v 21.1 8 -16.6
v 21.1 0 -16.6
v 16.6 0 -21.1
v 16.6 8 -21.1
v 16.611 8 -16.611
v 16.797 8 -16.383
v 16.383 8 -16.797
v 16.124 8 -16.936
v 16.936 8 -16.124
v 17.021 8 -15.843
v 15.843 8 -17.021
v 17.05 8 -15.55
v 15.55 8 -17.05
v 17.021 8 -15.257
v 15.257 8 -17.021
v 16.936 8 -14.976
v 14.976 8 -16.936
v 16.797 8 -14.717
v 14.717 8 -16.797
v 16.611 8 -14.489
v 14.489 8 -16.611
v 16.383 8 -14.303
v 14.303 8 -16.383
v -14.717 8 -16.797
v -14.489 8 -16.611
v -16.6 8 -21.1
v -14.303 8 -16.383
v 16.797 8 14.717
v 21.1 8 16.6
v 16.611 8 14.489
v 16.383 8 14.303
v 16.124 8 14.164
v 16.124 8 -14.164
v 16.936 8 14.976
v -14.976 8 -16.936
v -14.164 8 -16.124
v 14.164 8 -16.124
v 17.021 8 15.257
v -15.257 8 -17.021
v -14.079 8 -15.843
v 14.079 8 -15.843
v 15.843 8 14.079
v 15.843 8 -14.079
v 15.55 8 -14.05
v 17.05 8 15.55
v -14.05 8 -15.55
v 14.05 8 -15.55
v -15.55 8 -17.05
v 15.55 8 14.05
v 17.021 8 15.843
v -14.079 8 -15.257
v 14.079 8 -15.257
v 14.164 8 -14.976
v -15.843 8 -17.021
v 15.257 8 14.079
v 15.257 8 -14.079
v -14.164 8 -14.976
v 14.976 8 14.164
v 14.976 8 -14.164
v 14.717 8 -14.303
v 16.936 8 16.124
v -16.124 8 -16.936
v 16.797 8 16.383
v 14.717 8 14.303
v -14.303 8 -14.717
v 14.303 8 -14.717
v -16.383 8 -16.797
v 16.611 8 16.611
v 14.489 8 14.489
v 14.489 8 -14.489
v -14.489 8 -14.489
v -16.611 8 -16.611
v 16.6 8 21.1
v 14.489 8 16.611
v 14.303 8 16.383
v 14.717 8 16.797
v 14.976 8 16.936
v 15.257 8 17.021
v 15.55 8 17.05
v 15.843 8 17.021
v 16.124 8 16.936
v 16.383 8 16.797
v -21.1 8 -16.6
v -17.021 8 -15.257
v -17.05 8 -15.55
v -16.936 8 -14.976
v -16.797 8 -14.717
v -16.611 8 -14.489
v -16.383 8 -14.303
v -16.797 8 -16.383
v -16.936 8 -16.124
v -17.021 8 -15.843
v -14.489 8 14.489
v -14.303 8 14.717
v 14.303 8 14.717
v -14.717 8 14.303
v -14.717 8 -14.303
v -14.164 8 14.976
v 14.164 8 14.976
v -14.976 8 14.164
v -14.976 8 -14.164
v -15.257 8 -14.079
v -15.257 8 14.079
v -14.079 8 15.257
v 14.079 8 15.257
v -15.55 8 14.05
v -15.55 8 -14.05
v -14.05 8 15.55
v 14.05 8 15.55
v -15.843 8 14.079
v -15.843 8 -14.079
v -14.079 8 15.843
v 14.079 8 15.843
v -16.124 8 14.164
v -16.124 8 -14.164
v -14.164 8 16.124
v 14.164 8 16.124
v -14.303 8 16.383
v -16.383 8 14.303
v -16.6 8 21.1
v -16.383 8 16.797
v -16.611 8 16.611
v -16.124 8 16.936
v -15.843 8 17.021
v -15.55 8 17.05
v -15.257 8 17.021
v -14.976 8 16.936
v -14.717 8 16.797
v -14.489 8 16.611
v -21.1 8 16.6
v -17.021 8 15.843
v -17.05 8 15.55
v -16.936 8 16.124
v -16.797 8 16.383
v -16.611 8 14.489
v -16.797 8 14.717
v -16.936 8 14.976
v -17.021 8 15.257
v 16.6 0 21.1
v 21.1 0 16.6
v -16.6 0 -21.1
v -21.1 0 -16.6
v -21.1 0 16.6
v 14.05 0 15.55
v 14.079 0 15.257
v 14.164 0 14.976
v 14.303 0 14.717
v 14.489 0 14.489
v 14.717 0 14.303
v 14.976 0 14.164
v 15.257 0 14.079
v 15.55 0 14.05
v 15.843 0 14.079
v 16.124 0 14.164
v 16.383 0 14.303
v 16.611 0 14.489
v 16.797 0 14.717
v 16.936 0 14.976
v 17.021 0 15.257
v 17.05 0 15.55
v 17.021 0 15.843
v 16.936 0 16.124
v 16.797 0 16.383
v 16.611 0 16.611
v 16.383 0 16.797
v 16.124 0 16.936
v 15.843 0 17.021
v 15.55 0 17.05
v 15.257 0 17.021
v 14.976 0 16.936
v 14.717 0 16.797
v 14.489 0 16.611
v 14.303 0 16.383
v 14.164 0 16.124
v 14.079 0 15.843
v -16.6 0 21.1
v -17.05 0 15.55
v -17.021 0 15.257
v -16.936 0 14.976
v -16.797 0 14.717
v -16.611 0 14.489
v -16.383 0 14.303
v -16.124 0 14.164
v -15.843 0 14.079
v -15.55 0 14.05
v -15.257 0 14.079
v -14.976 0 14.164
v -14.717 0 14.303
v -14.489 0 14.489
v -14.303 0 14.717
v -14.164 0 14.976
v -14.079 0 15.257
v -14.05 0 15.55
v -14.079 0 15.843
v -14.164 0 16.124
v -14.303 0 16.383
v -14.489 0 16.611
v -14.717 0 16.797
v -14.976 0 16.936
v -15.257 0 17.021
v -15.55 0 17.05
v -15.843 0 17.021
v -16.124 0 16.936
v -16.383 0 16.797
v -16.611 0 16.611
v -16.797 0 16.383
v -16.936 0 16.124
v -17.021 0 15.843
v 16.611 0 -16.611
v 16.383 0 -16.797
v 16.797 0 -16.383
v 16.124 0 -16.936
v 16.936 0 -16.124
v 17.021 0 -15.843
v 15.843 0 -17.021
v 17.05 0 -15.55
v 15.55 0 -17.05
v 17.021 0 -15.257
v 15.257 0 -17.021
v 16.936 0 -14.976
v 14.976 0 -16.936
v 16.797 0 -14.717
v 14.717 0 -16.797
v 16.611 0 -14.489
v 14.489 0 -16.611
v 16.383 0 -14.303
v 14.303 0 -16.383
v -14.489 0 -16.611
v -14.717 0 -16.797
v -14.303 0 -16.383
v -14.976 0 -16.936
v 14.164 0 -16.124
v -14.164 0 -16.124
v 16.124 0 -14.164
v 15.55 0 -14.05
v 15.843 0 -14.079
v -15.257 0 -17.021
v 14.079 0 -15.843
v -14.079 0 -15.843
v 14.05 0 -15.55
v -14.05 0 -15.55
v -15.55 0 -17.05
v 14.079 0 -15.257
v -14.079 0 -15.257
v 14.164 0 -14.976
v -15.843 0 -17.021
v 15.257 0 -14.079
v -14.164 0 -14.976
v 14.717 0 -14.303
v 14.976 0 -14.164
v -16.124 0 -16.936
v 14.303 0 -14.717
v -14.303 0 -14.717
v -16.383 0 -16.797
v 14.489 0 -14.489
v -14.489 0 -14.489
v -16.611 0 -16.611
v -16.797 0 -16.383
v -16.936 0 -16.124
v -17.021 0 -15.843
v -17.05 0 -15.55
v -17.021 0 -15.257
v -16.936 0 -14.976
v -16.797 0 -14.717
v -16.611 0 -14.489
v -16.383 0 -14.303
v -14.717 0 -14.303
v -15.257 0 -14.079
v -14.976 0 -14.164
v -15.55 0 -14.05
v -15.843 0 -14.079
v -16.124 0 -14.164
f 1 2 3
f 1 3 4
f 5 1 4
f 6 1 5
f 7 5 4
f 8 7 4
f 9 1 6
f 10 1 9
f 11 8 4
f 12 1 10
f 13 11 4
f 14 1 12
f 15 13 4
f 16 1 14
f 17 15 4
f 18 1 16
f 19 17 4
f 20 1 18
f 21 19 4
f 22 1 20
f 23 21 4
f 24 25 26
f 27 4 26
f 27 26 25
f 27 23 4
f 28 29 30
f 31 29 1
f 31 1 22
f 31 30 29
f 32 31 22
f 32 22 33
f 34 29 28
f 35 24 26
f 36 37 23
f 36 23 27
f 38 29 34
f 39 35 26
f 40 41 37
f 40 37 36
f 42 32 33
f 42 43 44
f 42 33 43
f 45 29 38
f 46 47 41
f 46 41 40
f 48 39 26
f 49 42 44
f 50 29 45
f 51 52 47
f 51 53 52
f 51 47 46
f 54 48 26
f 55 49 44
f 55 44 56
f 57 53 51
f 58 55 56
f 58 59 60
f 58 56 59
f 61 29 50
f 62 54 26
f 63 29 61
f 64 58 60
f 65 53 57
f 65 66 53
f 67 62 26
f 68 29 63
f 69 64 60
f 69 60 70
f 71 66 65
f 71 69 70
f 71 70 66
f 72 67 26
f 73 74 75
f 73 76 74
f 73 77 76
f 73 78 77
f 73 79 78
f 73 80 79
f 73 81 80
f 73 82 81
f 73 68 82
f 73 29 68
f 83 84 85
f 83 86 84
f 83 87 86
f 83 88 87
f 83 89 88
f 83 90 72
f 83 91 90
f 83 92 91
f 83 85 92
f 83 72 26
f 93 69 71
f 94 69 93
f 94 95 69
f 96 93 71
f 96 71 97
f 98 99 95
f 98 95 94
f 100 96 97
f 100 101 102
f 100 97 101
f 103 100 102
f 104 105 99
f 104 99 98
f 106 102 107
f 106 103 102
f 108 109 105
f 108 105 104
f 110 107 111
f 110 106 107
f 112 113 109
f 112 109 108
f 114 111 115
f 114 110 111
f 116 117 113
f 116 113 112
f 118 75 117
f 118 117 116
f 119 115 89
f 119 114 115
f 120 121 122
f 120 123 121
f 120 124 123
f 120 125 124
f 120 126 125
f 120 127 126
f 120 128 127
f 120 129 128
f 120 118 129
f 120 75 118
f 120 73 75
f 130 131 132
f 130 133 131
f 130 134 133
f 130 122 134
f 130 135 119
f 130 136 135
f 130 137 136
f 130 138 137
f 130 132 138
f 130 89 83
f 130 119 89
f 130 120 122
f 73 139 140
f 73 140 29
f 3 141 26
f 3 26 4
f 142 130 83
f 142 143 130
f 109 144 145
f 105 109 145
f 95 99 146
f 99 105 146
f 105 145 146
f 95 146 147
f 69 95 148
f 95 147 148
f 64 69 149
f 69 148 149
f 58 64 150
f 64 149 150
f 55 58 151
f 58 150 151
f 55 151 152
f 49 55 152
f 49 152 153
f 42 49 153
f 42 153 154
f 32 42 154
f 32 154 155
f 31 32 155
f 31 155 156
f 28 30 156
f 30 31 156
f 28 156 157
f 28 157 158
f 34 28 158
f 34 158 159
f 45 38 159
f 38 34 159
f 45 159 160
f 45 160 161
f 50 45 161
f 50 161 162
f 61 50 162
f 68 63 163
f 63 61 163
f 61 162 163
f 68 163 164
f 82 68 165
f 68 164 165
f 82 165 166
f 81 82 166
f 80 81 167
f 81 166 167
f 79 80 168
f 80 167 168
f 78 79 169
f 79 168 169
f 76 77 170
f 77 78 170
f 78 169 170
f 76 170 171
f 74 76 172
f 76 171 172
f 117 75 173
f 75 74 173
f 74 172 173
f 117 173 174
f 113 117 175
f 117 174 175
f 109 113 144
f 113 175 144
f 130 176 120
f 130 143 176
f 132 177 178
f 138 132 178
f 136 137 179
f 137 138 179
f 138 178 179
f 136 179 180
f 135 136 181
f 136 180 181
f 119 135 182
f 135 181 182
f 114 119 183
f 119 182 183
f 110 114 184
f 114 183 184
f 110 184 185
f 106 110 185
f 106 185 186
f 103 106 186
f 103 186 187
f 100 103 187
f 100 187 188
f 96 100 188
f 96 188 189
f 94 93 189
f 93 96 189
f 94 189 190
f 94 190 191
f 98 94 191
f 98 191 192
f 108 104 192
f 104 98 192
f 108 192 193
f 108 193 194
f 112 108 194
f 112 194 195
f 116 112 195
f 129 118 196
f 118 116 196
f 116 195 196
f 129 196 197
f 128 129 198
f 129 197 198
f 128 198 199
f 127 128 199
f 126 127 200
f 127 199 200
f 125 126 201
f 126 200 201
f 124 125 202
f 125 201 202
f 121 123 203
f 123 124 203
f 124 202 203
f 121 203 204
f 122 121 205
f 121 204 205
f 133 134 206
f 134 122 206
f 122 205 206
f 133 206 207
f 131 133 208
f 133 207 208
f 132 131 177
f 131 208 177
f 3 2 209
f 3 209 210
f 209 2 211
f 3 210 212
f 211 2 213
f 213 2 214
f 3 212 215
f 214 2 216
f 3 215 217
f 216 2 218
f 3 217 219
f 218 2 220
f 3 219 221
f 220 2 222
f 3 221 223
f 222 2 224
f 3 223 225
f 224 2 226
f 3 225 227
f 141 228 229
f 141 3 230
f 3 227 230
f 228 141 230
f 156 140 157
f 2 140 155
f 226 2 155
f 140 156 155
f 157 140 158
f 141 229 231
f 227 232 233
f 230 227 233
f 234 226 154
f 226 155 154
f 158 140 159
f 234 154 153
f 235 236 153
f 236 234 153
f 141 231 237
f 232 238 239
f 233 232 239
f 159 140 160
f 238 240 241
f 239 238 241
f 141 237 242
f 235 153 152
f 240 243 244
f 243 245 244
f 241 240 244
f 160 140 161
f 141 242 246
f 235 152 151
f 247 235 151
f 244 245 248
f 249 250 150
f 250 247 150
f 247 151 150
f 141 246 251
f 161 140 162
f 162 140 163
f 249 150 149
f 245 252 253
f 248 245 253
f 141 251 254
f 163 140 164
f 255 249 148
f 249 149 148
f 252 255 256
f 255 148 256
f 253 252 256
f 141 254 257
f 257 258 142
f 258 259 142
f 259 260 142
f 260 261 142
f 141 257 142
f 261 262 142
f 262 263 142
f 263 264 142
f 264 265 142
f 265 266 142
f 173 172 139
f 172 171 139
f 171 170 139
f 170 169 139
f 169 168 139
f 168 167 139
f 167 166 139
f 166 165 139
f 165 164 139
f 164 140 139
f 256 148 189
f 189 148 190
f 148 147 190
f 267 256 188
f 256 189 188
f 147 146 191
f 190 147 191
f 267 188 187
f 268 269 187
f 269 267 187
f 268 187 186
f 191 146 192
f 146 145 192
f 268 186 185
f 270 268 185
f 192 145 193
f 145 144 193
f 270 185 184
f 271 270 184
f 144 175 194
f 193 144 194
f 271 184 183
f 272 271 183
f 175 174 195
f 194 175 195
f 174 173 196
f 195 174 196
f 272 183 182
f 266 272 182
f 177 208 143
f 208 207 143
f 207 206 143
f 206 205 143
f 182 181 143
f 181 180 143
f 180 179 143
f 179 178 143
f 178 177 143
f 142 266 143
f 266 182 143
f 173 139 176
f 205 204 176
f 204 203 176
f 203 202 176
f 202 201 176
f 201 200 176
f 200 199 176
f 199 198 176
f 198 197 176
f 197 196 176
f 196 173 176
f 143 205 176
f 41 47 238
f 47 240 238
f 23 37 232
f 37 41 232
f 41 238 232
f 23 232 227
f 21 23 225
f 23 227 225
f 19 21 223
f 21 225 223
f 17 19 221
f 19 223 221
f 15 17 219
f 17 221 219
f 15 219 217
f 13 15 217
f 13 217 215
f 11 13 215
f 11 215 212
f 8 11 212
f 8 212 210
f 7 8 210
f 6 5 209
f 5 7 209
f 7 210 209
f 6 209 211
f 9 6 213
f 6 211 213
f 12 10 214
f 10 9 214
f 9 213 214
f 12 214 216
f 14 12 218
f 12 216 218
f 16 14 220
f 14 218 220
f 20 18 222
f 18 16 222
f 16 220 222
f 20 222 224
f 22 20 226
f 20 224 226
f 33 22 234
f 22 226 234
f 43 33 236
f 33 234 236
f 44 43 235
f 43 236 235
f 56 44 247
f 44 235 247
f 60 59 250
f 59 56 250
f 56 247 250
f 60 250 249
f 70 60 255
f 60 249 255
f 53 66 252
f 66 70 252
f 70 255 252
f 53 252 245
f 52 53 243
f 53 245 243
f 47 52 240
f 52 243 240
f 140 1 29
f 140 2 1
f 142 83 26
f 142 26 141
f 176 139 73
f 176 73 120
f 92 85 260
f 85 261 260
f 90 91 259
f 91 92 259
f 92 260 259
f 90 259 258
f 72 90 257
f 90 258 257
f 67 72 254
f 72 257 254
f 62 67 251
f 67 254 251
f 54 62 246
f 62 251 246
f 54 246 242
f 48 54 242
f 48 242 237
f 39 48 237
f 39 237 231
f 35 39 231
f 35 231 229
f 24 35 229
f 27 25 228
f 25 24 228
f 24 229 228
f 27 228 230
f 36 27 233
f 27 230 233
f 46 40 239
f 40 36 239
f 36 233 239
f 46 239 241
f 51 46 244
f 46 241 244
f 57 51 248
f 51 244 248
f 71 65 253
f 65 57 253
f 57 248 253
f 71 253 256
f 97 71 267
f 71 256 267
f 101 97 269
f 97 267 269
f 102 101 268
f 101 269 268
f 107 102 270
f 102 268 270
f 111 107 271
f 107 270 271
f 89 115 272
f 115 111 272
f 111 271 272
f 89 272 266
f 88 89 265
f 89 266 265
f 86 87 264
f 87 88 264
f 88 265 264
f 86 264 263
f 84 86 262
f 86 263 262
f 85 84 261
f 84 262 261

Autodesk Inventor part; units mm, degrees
ref_plane "YZ Plane" through (0, 0, 0) normal (1, 0, 0) x (0, 1, 0)
ref_plane "XZ Plane" through (0, 0, 0) normal (0, 1, 0) x (-1, 0, 0)
ref_plane "XY Plane" through (0, 0, 0) normal (0, 0, 1) x (1, 0, 0)
sketch "Эскиз1" plane through (0, 0, 0) normal (0, 1, 0) x (-1, 0, 0)
  line L0 (21.1, -21.1) -> (-21.1, -21.1)
  line L1 (-21.1, -21.1) -> (-21.1, 21.1)
  line L2 (-21.1, 21.1) -> (21.1, 21.1)
  line L3 (21.1, 21.1) -> (21.1, -21.1)
  line L4 (21.1, -21.1) -> (-21.1, 21.1) construction
  line L5 (-21.1, -21.1) -> (21.1, 21.1) construction
  line L6 (-15.55, 15.55) -> (15.55, 15.55) construction
  line L7 (15.55, 15.55) -> (15.55, -15.55) construction
  line L8 (15.55, -15.55) -> (-15.55, -15.55) construction
  line L9 (-15.55, -15.55) -> (-15.55, 15.55) construction
  line L10 (-15.55, 15.55) -> (15.55, -15.55) construction
  line L11 (15.55, 15.55) -> (-15.55, -15.55) construction
  circle A0 centre (-15.55, -15.55) radius 1.5
  circle A1 centre (15.55, -15.55) radius 1.5
  circle A2 centre (15.55, 15.55) radius 1.5
  circle A3 centre (-15.55, 15.55) radius 1.5
  point P0 (0, 0)
  dimension "d0" = 42.2
  dimension "d1" = 42.2
  dimension "d2" = 31.1
  dimension "d3" = 31.1
  dimension "d4" = 3
  dimension "d5" = 3
  dimension "d6" = 3
  dimension "d7" = 3
extrude "Выдавливание1" add sketch "Эскиз1" along normal blind 8
chamfer "Фаска1" distance 4.5 angle 45 4 edges at (21.1, 4, -21.1) (21.1, 4, 21.1) (-21.1, 4, 21.1) (-21.1, 4, -21.1)
thread "Резьба1" size "M3x0.5" class "6H" standard "ANSI Metric M Profile" full length
thread "Резьба2" size "M3x0.5" class "6H" standard "ANSI Metric M Profile" full length
thread "Резьба3" size "M3x0.5" class "6H" standard "ANSI Metric M Profile" full length
thread "Резьба4" size "M3x0.5" class "6H" standard "ANSI Metric M Profile" full length
properties part number "Top"
